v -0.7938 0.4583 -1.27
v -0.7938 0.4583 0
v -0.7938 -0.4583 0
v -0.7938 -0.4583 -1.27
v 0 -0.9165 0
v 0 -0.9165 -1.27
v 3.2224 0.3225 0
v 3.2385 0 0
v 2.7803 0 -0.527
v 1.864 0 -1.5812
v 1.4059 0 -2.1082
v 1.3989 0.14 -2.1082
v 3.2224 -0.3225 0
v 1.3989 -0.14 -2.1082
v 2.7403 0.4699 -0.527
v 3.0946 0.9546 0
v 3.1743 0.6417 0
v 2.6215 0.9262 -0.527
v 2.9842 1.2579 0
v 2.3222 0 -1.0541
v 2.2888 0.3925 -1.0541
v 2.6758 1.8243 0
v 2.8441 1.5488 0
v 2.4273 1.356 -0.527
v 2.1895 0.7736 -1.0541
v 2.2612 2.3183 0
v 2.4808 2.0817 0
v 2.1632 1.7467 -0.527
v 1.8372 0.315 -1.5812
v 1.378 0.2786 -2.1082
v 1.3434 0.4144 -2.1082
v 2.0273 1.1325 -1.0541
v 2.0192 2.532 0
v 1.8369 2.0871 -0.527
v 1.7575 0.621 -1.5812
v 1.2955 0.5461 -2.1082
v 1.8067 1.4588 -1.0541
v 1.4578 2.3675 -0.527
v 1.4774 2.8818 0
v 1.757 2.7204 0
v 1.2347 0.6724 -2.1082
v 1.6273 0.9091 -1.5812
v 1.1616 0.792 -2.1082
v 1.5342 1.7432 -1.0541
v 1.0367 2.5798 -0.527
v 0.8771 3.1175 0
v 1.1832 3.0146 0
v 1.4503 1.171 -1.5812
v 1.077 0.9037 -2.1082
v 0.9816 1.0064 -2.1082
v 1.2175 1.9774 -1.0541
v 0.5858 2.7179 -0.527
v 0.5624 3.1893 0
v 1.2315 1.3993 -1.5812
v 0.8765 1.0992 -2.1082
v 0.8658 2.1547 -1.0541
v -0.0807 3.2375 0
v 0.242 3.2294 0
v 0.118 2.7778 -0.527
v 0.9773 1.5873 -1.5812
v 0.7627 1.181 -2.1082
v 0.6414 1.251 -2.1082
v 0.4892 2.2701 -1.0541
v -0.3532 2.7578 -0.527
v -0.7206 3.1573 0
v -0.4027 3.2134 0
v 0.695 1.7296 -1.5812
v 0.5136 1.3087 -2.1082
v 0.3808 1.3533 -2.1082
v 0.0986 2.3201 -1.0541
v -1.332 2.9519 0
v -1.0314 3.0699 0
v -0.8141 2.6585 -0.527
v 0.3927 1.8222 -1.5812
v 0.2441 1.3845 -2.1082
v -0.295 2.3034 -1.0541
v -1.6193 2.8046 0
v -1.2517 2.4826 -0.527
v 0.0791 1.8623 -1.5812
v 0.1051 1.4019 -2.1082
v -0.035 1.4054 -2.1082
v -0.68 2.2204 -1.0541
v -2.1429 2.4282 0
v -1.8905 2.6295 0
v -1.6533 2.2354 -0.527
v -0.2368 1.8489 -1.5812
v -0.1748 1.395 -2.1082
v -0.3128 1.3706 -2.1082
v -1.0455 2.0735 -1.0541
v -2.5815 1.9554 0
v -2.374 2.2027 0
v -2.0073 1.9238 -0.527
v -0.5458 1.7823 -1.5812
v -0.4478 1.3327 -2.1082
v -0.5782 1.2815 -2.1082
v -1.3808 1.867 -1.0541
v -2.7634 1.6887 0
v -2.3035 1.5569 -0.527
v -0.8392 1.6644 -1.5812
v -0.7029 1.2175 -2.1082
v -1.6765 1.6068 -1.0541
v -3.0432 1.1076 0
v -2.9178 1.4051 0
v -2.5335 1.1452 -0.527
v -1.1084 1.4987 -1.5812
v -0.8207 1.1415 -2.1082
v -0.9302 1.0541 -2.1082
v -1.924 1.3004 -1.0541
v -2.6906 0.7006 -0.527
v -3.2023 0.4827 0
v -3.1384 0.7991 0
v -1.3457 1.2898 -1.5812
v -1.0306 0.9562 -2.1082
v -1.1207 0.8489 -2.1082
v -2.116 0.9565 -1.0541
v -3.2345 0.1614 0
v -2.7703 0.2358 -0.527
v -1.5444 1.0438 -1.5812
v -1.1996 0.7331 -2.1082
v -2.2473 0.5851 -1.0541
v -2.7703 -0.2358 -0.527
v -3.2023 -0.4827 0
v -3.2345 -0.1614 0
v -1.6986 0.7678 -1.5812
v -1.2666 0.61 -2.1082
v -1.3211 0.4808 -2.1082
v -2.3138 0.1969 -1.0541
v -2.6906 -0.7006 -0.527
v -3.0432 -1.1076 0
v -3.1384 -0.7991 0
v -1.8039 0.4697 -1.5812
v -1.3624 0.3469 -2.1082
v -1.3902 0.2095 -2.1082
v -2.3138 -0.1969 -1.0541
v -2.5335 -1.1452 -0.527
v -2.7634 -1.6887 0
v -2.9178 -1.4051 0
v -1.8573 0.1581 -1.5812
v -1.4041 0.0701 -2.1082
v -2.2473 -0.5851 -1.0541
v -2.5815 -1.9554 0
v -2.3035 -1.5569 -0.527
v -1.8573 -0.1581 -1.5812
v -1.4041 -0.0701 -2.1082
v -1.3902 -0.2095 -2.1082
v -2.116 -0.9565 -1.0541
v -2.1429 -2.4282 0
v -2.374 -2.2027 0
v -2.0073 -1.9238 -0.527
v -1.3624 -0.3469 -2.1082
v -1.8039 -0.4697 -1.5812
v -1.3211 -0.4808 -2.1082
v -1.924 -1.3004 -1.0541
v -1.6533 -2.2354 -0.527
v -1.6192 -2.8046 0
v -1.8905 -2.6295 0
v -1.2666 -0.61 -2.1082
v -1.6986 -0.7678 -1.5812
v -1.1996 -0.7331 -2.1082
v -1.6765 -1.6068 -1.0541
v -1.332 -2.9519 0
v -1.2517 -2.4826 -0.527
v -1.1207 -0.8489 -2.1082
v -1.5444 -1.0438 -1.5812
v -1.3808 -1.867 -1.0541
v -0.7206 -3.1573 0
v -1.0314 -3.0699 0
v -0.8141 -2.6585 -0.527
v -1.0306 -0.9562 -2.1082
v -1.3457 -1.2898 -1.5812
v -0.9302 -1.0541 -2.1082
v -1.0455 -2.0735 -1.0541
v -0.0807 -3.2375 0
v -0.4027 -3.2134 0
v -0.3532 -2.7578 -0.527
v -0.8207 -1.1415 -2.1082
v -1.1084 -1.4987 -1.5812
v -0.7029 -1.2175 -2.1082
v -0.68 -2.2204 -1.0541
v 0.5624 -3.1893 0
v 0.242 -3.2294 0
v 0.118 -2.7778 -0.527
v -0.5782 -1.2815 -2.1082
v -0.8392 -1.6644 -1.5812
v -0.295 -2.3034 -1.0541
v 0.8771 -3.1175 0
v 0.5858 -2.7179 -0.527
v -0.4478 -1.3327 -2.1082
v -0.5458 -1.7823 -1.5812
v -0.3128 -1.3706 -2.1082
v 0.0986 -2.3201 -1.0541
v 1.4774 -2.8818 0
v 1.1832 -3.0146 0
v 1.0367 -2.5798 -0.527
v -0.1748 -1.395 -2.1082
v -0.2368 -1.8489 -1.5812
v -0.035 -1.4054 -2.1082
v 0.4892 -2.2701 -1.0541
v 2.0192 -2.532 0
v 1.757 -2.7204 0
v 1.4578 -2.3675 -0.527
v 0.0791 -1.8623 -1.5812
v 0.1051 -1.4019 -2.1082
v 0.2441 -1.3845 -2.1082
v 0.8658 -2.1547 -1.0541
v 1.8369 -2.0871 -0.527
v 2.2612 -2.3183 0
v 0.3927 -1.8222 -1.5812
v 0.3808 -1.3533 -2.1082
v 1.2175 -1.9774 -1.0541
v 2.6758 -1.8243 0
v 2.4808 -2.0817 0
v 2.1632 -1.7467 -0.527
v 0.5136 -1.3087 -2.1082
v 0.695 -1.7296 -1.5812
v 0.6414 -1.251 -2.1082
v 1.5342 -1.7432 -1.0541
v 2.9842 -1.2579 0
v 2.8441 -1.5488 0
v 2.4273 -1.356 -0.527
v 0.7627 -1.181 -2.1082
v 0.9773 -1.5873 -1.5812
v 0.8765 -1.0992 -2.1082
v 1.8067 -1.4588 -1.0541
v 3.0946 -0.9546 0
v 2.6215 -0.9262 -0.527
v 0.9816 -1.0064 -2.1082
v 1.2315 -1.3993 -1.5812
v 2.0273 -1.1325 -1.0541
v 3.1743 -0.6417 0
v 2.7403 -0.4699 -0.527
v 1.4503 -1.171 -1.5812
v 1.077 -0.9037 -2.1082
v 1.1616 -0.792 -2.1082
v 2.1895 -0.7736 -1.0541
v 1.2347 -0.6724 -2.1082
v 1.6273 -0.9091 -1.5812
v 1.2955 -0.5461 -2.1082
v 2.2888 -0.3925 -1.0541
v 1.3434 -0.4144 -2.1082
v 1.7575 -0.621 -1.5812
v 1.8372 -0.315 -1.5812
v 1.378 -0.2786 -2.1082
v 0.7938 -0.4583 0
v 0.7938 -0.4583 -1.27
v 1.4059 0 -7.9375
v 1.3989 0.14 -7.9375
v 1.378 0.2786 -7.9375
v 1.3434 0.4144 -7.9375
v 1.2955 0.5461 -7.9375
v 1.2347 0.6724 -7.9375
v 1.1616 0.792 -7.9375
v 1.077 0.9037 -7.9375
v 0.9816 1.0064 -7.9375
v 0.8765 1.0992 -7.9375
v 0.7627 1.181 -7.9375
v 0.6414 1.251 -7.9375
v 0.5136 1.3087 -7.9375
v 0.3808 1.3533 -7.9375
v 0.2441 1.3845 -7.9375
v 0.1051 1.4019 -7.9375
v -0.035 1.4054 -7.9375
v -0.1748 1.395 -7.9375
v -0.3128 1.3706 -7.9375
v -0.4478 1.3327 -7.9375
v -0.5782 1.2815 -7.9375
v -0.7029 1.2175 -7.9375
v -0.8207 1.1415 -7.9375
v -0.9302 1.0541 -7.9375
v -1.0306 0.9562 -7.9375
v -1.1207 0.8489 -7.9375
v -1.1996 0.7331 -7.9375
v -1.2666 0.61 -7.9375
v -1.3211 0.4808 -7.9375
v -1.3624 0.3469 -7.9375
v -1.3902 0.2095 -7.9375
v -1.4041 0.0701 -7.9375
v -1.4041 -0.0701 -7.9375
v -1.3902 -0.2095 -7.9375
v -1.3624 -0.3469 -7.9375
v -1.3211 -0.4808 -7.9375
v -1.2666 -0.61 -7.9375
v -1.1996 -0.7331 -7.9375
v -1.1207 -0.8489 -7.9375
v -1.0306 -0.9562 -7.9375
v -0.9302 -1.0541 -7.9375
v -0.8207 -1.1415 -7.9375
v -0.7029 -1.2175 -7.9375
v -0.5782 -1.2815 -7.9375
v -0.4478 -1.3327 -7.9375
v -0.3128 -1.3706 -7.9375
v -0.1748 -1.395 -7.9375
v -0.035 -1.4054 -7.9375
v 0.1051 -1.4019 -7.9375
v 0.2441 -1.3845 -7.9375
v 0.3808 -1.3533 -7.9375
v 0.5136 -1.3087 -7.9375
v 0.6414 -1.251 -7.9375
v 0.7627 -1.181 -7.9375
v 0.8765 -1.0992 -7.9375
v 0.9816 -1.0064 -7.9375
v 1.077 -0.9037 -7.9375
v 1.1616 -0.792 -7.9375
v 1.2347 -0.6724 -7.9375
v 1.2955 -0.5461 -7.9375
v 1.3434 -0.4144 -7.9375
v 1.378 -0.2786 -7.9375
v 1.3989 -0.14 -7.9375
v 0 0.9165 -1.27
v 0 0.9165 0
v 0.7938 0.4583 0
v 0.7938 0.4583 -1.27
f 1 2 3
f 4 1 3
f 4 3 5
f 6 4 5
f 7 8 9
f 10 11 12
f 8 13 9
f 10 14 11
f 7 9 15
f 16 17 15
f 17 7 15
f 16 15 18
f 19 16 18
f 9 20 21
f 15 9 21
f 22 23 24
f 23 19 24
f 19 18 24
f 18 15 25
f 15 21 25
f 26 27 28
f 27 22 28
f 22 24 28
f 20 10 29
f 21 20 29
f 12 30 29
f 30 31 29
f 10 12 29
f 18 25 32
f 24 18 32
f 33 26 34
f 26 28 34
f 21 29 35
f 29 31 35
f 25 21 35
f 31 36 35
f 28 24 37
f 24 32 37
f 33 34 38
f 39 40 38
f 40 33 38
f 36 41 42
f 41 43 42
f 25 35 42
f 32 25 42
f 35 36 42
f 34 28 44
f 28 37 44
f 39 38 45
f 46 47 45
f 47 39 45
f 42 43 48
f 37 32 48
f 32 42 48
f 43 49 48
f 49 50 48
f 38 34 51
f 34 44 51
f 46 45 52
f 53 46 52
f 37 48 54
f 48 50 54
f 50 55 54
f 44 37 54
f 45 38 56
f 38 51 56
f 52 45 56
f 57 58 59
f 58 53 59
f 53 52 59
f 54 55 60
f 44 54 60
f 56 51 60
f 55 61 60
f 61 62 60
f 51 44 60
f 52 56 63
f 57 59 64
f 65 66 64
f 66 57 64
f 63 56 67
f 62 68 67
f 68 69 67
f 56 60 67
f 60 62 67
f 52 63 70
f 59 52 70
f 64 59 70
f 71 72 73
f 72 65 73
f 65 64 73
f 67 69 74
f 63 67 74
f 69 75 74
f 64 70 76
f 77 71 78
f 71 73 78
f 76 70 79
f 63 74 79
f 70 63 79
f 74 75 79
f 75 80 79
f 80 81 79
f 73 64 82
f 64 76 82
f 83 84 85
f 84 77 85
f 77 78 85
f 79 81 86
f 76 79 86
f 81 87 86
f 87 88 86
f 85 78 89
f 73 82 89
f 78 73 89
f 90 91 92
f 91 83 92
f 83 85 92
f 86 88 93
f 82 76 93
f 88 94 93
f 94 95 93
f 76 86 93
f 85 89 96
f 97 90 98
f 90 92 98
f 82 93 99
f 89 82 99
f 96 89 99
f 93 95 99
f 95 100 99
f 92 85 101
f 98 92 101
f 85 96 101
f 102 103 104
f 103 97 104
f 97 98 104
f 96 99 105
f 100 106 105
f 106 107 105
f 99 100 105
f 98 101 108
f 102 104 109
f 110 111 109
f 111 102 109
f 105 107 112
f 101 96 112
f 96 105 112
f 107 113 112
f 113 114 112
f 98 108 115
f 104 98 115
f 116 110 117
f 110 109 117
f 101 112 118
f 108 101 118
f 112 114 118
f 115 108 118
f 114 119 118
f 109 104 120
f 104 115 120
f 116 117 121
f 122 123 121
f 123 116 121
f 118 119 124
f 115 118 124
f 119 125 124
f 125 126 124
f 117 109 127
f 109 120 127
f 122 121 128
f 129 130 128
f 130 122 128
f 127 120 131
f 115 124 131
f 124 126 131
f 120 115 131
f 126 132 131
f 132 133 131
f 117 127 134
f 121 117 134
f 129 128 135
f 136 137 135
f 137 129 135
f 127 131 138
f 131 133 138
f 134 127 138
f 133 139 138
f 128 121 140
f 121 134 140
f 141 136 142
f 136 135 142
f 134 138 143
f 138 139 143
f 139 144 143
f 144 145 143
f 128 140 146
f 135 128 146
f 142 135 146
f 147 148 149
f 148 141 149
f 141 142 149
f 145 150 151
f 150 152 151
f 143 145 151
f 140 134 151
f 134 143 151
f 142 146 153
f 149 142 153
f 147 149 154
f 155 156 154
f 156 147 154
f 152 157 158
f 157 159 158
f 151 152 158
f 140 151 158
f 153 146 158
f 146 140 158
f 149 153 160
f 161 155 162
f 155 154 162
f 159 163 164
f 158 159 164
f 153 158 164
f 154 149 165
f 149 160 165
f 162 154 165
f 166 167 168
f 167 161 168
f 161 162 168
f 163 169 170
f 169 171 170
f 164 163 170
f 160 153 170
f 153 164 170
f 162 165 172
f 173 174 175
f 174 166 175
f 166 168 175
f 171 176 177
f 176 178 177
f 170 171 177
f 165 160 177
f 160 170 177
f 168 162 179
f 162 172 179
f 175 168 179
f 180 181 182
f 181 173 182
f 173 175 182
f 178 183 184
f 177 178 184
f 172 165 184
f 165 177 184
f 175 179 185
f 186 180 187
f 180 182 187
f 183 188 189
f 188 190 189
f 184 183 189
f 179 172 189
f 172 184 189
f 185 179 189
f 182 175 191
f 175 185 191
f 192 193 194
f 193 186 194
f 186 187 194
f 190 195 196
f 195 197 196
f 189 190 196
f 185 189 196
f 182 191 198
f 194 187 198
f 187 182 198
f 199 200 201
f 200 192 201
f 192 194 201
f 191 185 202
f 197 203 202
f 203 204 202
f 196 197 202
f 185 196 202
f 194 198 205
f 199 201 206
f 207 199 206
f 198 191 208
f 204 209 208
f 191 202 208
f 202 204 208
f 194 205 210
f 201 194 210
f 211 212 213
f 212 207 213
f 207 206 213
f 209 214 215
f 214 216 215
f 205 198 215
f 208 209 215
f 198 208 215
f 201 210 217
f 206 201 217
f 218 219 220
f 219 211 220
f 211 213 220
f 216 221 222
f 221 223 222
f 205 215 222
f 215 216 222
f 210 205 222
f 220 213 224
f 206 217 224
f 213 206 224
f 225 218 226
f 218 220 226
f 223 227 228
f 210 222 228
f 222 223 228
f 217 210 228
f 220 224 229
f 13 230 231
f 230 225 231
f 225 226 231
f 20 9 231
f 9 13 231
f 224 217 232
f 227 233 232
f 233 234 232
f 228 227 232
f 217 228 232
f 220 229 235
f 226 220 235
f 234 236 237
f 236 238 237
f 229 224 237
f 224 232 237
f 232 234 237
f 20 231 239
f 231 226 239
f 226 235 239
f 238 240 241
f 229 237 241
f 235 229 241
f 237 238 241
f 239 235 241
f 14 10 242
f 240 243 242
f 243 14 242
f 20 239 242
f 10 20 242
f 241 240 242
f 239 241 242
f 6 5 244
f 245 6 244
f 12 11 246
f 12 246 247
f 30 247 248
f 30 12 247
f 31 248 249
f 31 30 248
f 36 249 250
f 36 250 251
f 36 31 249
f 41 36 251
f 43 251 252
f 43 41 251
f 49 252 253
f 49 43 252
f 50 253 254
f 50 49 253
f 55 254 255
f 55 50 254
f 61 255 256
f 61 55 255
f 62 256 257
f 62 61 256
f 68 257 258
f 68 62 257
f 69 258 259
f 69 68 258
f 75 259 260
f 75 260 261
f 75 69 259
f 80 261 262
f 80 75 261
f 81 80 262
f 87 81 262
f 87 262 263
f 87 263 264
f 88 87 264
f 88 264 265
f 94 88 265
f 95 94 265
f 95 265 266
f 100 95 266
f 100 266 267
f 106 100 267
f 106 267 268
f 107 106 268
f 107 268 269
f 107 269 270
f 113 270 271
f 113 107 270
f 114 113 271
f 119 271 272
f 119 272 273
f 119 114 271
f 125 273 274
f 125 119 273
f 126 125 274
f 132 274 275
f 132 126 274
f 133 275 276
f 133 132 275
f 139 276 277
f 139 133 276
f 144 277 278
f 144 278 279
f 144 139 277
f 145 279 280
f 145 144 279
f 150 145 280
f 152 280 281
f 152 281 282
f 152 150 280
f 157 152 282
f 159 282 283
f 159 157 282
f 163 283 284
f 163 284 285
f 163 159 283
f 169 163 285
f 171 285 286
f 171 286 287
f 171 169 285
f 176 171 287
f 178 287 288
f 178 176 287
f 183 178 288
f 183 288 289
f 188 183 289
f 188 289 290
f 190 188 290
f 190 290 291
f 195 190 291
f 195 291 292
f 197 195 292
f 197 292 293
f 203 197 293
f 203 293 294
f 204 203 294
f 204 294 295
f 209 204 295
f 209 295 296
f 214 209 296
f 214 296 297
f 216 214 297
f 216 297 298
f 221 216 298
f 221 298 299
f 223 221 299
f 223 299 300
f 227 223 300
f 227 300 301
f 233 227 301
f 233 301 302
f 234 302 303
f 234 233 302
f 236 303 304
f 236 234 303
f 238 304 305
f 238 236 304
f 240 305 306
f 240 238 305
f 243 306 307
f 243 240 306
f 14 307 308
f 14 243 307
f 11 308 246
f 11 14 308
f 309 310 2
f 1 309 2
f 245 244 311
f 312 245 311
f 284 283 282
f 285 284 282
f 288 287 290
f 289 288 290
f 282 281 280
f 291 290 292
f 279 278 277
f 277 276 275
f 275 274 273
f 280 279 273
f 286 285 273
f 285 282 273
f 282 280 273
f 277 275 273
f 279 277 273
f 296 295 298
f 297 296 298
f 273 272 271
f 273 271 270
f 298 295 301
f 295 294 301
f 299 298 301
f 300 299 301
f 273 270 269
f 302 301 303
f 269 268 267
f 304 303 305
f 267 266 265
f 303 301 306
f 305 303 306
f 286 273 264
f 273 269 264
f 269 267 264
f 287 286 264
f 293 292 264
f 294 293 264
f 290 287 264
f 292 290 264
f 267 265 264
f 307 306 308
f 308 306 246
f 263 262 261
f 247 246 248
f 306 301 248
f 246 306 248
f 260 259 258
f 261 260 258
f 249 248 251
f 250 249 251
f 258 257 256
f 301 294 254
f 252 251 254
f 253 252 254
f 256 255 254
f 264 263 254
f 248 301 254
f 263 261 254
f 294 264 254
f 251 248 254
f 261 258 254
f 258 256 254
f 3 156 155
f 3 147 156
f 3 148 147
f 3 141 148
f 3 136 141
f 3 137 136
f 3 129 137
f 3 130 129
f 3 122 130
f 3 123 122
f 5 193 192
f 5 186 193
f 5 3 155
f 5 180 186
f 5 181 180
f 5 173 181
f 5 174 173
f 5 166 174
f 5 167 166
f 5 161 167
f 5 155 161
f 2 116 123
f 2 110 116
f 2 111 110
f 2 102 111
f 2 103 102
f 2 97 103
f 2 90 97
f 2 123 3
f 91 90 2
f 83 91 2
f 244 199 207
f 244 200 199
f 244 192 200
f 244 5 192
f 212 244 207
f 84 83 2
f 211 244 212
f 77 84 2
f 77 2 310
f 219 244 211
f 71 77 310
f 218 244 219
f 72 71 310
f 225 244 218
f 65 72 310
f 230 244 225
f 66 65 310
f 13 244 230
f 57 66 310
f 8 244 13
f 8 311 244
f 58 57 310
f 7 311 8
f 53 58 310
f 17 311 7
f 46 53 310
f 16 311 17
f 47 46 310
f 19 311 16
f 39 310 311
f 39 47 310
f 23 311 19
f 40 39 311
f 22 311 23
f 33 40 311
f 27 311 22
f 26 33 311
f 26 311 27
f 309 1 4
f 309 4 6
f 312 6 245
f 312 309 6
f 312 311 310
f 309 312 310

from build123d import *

# Parameters (mm, degrees)
F0_R     = 3.2385
F1_DEPTH = 2.1082
F1_TAPER = 41
F3_DEPTH = 5.8293
F5_DEPTH = 1.27


with BuildPart() as f1:
    # F0 (on Top) → F1 (new body)
    with BuildSketch(Plane.XY):
        Circle(F0_R)
    extrude(amount=-F1_DEPTH, taper=F1_TAPER)

    # F3 (add, through all): a face of the model
    f3_faces = [f1.faces().sort_by_distance(p)[0] for p in [
        (0, 0, -2.1082),
    ]]
    extrude(f3_faces, amount=F3_DEPTH)

    # F4 (on face) → F5 (cut)
    with BuildSketch(Plane.XY):
        Polygon((0.79375, -0.4582717762), (0.79375, 0.4582717762), (0, 0.9165435523), (-0.79375, 0.4582717762), (-0.79375, -0.4582717762), (0, -0.9165435523), align=None)
    extrude(amount=-F5_DEPTH, mode=Mode.SUBTRACT)


solid = f1.part
